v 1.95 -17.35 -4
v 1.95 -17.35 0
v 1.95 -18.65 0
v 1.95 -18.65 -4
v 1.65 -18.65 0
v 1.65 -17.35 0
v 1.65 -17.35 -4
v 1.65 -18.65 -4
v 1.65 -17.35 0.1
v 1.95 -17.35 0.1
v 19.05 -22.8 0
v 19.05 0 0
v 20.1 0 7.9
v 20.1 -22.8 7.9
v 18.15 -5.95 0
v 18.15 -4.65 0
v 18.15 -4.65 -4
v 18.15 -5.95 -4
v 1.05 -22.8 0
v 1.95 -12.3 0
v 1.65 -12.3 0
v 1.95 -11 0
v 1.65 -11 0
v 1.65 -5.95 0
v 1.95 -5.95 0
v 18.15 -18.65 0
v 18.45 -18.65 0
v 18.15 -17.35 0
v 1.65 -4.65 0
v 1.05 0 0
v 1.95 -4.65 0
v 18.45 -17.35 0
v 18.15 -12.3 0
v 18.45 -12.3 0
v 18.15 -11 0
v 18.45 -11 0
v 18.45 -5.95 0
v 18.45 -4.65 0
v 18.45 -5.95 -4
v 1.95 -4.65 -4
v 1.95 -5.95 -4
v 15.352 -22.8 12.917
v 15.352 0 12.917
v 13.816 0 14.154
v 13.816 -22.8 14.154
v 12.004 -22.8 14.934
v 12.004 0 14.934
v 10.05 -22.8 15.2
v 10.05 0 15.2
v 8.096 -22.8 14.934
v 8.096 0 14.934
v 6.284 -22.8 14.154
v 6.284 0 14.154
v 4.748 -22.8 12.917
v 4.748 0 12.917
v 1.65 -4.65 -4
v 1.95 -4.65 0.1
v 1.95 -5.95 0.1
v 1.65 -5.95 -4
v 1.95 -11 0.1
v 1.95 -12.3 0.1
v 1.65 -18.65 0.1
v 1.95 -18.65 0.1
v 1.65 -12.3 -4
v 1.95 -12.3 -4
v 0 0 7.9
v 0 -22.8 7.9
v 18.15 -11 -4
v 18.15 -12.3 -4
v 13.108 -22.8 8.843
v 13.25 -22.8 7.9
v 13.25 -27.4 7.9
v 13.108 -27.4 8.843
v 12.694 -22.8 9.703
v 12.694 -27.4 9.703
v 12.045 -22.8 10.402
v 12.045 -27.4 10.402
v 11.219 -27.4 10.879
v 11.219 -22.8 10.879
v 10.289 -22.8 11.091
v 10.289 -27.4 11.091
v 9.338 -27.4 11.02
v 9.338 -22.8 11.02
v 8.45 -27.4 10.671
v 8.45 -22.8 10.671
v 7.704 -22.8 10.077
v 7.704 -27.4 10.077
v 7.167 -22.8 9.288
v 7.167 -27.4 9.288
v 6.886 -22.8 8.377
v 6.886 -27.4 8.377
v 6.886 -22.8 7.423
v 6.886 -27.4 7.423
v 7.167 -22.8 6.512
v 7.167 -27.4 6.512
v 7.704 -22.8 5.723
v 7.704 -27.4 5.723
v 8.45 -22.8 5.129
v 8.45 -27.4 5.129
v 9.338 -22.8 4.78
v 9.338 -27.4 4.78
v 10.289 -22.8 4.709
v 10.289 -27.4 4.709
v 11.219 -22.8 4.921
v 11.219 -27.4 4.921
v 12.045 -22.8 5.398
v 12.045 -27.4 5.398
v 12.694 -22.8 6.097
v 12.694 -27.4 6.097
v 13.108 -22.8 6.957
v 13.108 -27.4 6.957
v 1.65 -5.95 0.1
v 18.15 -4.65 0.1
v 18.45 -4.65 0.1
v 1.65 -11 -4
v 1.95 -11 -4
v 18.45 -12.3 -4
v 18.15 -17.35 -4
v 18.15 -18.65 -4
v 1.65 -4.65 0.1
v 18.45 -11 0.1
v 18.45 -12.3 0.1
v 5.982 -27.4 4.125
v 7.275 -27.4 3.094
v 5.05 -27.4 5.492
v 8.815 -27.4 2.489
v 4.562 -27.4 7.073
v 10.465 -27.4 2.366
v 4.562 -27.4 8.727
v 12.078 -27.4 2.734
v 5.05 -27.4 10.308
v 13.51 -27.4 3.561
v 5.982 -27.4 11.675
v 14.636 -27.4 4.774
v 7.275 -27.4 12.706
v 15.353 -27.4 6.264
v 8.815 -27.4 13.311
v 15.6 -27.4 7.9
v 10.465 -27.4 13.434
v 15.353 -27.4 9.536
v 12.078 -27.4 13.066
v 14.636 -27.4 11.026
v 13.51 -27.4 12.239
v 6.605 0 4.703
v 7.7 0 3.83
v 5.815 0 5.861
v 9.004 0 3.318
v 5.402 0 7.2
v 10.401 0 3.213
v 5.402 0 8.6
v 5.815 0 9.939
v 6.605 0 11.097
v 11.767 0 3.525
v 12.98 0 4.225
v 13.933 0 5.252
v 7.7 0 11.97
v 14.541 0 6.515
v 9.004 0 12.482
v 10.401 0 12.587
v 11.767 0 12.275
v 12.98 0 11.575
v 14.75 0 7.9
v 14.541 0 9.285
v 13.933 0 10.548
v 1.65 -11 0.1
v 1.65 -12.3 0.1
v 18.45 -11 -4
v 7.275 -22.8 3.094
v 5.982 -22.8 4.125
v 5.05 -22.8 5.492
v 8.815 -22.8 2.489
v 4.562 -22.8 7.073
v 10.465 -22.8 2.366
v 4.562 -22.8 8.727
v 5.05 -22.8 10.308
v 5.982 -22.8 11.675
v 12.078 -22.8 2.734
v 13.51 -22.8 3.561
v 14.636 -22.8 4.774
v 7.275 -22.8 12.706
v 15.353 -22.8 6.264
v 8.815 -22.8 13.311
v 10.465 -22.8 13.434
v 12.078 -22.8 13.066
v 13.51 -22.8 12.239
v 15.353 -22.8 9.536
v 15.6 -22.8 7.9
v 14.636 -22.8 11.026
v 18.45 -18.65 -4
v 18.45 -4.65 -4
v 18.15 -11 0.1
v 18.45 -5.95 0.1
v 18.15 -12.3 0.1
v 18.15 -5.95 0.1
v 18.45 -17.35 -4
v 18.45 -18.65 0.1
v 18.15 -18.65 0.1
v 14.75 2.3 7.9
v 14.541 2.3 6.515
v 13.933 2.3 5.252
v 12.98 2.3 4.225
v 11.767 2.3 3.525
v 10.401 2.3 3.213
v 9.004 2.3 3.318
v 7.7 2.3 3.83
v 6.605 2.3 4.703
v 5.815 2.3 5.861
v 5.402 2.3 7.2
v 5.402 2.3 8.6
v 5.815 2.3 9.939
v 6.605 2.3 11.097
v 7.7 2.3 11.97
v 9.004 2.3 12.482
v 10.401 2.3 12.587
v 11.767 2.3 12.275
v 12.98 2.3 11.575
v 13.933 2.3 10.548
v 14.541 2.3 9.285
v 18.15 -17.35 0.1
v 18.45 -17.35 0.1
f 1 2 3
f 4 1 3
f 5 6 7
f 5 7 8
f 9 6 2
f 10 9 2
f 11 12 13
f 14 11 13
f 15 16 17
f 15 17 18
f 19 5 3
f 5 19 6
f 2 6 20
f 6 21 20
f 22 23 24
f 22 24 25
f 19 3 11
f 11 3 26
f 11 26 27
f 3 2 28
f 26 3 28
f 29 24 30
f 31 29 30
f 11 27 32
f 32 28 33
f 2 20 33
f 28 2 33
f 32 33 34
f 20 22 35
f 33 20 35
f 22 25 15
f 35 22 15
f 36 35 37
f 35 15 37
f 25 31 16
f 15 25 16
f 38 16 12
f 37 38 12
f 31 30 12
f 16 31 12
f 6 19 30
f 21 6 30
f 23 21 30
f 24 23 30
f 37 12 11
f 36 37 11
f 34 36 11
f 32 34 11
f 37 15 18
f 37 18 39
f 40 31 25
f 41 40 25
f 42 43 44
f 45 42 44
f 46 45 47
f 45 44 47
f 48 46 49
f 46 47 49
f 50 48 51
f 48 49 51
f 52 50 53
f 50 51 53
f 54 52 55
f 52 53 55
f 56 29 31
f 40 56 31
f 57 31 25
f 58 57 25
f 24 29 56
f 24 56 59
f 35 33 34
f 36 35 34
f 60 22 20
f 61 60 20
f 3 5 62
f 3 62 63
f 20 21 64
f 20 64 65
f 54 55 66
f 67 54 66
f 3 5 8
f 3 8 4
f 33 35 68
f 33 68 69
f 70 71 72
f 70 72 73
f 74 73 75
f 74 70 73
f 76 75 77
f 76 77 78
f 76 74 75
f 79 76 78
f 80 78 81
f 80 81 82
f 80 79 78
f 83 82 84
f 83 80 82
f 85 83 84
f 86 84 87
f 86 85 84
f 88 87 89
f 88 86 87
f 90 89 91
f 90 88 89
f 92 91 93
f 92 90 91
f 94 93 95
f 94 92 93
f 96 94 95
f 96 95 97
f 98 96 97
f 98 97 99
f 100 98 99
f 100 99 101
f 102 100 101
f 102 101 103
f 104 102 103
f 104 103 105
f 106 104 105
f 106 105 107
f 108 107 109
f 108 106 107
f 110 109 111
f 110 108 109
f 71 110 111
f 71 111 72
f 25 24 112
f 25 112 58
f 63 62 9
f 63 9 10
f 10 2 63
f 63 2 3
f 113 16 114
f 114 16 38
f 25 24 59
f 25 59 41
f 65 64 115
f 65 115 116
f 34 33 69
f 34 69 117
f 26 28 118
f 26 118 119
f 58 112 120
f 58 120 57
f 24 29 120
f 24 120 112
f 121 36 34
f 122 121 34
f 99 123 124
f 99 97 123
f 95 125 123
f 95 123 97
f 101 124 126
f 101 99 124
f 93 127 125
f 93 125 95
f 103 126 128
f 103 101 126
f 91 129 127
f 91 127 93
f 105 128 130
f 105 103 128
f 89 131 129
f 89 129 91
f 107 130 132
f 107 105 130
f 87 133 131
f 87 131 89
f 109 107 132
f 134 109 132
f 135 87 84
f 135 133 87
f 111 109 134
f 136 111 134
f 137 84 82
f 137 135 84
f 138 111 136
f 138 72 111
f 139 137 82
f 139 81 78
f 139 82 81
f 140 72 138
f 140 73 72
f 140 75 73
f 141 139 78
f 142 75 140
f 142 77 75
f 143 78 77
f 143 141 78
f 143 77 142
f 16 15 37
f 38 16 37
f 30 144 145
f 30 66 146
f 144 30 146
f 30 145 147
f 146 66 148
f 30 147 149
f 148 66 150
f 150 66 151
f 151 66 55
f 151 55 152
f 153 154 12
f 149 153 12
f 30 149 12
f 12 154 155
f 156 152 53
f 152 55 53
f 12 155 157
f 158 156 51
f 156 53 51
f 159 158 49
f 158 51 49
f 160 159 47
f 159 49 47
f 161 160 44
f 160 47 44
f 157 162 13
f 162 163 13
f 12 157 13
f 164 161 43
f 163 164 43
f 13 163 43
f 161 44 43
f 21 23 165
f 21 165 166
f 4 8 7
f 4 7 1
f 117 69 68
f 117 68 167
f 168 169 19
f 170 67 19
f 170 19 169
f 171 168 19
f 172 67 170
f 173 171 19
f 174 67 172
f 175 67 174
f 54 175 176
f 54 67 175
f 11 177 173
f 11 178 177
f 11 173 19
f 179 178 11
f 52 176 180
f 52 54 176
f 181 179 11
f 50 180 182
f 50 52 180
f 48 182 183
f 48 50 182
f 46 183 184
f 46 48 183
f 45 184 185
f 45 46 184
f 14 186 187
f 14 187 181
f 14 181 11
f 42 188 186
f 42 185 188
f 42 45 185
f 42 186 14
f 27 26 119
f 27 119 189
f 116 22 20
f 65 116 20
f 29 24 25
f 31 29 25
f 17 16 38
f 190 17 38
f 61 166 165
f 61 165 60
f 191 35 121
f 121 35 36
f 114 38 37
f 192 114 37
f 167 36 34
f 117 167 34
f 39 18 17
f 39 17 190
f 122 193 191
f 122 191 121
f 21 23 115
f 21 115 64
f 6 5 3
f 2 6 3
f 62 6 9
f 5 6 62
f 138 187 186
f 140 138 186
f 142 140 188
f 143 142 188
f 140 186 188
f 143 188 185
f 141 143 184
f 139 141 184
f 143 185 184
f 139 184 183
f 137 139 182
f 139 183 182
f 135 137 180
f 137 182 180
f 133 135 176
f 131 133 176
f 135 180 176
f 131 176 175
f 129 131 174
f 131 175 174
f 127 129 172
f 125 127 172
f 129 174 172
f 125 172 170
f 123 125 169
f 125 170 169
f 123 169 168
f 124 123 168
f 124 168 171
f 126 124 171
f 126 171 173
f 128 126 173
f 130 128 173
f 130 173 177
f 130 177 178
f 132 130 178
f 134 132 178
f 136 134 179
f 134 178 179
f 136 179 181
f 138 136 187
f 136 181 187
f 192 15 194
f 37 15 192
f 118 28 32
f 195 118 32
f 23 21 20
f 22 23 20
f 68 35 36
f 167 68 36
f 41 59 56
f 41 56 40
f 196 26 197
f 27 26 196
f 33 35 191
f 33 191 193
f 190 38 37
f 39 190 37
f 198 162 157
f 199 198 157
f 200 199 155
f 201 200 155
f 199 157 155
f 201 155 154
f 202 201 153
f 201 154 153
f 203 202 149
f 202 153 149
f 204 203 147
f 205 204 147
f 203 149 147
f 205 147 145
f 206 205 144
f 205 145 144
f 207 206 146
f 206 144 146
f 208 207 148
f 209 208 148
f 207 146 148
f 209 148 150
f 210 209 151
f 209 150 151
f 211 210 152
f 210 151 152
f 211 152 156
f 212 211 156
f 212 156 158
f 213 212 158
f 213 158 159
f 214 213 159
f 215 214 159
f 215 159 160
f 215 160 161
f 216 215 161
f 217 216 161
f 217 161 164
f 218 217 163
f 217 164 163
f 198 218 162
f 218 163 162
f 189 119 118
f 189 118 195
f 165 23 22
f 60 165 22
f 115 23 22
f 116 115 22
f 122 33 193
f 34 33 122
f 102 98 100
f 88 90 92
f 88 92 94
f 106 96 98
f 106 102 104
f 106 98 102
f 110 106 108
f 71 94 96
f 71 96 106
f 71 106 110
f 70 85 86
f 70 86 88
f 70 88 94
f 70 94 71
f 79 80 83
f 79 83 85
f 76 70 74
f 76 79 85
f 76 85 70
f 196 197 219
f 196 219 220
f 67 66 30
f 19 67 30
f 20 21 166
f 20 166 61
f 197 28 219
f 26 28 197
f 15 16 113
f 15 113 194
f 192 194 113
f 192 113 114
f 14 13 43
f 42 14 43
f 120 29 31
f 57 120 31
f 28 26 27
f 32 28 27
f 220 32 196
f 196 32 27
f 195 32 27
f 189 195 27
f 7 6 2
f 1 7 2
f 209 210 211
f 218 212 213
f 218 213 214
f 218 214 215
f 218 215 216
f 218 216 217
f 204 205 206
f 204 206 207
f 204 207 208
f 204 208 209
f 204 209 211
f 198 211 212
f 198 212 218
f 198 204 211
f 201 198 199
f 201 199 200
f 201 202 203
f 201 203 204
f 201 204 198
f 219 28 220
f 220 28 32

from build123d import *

# Parameters (mm, degrees)
PAD_DEPTH     = 22.8
SKETCH001_R   = 5.55
SKETCH001_R_2 = 3.2
PAD001_DEPTH  = 4.6
SKETCH002_R   = 4.7
PAD002_DEPTH  = 2.3
SKETCH003_W   = 0.3
SKETCH003_H   = 1.3
POCKET_DEPTH  = 0.1
SKETCH004_W   = 0.3
SKETCH004_H   = 1.3
PAD003_DEPTH  = 4
SKETCH005_W   = 0.3
SKETCH005_H   = 1.3
PAD004_DEPTH  = 4
SKETCH006_W   = 0.3
SKETCH006_H   = 1.3
PAD005_DEPTH  = 4
SKETCH007_W   = 0.3
SKETCH007_H   = 1.3
PAD006_DEPTH  = 4
SKETCH008_W   = 0.3
SKETCH008_H   = 1.3
PAD007_DEPTH  = 4
SKETCH009_W   = 0.3
SKETCH009_H   = 1.3
PAD008_DEPTH  = 4


with BuildPart() as jack:
    # Sketch → Pad (new body)
    with BuildSketch(Plane.XZ):
        with BuildLine():
            Line((0, 7.9), (1.05, 0))
            Line((1.05, 0), (19.05, 0))
            Line((19.05, 0), (20.1, 7.9))
            Line((20.1, 7.9), (15.352488, 12.917333))
            ThreePointArc((15.352488, 12.917333), (10.05, 15.2), (4.747512, 12.917333))
            Line((4.747512, 12.917333), (0, 7.9))
        make_face()
    extrude(amount=PAD_DEPTH)

    # Sketch001 (on Face8 of Pad) → Pad001 (join)
    with BuildSketch(Plane.XZ.offset(22.8)):
        with Locations((10.05, 7.9)):
            Circle(SKETCH001_R)
        with Locations((10.05, 7.9)):
            Circle(SKETCH001_R_2, mode=Mode.SUBTRACT)
    extrude(amount=PAD001_DEPTH)

    # Sketch002 (on Face4 of Pad001) → Pad002 (join)
    with BuildSketch(Plane(origin=(0, 0, 0), x_dir=(1, 0, 0), z_dir=(0, 1, 0))):
        with Locations((10.05, -7.9)):
            Circle(SKETCH002_R)
    extrude(amount=PAD002_DEPTH)

    # Sketch003 (on Face3 of Pad002) → Pocket (cut)
    with BuildSketch(Plane(origin=(0, 0, 0), x_dir=(1, 0, 0), z_dir=(0, 0, -1))):
        with Locations((1.8, 18)):
            Rectangle(SKETCH003_W, SKETCH003_H)
        with Locations((1.8, 11.65)):
            Rectangle(SKETCH003_W, SKETCH003_H)
        with Locations((1.8, 5.3)):
            Rectangle(SKETCH003_W, SKETCH003_H)
        with Locations((18.3, 5.3)):
            Rectangle(SKETCH003_W, SKETCH003_H)
        with Locations((18.3, 11.65)):
            Rectangle(SKETCH003_W, SKETCH003_H)
        with Locations((18.3, 18)):
            Rectangle(SKETCH003_W, SKETCH003_H)
    extrude(amount=-POCKET_DEPTH, mode=Mode.SUBTRACT)


with BuildPart() as pinsn:
    # Sketch004 (on Face1 of ReferencePocket001) → Pad003 (new body)
    with BuildSketch(Plane(origin=(0, 0, 0), x_dir=(1, 0, 0), z_dir=(0, 0, -1))):
        with Locations((1.8, 18)):
            Rectangle(SKETCH004_W, SKETCH004_H)
    extrude(amount=PAD003_DEPTH)


with BuildPart() as pinrn:
    # Sketch005 (on Face1 of ReferencePocket) → Pad004 (new body)
    with BuildSketch(Plane(origin=(0, 0, 0), x_dir=(1, 0, 0), z_dir=(0, 0, -1))):
        with Locations((1.8, 11.65)):
            Rectangle(SKETCH005_W, SKETCH005_H)
    extrude(amount=PAD004_DEPTH)


with BuildPart() as pintn:
    # Sketch006 (on Face1 of ReferencePocket002) → Pad005 (new body)
    with BuildSketch(Plane(origin=(0, 0, 0), x_dir=(1, 0, 0), z_dir=(0, 0, -1))):
        with Locations((1.8, 5.3)):
            Rectangle(SKETCH006_W, SKETCH006_H)
    extrude(amount=PAD005_DEPTH)


with BuildPart() as pint:
    # Sketch007 (on Face1 of ReferencePocket003) → Pad006 (new body)
    with BuildSketch(Plane(origin=(0, 0, 0), x_dir=(1, 0, 0), z_dir=(0, 0, -1))):
        with Locations((18.3, 5.3)):
            Rectangle(SKETCH007_W, SKETCH007_H)
    extrude(amount=PAD006_DEPTH)


with BuildPart() as pinr:
    # Sketch008 (on Face1 of ReferencePocket004) → Pad007 (new body)
    with BuildSketch(Plane(origin=(0, 0, 0), x_dir=(1, 0, 0), z_dir=(0, 0, -1))):
        with Locations((18.3, 11.65)):
            Rectangle(SKETCH008_W, SKETCH008_H)
    extrude(amount=PAD007_DEPTH)


with BuildPart() as pins:
    # Sketch009 (on Face1 of ReferencePocket005) → Pad008 (new body)
    with BuildSketch(Plane(origin=(0, 0, 0), x_dir=(1, 0, 0), z_dir=(0, 0, -1))):
        with Locations((18.3, 18)):
            Rectangle(SKETCH009_W, SKETCH009_H)
    extrude(amount=PAD008_DEPTH)


solid = Compound([jack.part, pinsn.part, pinrn.part, pintn.part, pint.part, pinr.part, pins.part])
